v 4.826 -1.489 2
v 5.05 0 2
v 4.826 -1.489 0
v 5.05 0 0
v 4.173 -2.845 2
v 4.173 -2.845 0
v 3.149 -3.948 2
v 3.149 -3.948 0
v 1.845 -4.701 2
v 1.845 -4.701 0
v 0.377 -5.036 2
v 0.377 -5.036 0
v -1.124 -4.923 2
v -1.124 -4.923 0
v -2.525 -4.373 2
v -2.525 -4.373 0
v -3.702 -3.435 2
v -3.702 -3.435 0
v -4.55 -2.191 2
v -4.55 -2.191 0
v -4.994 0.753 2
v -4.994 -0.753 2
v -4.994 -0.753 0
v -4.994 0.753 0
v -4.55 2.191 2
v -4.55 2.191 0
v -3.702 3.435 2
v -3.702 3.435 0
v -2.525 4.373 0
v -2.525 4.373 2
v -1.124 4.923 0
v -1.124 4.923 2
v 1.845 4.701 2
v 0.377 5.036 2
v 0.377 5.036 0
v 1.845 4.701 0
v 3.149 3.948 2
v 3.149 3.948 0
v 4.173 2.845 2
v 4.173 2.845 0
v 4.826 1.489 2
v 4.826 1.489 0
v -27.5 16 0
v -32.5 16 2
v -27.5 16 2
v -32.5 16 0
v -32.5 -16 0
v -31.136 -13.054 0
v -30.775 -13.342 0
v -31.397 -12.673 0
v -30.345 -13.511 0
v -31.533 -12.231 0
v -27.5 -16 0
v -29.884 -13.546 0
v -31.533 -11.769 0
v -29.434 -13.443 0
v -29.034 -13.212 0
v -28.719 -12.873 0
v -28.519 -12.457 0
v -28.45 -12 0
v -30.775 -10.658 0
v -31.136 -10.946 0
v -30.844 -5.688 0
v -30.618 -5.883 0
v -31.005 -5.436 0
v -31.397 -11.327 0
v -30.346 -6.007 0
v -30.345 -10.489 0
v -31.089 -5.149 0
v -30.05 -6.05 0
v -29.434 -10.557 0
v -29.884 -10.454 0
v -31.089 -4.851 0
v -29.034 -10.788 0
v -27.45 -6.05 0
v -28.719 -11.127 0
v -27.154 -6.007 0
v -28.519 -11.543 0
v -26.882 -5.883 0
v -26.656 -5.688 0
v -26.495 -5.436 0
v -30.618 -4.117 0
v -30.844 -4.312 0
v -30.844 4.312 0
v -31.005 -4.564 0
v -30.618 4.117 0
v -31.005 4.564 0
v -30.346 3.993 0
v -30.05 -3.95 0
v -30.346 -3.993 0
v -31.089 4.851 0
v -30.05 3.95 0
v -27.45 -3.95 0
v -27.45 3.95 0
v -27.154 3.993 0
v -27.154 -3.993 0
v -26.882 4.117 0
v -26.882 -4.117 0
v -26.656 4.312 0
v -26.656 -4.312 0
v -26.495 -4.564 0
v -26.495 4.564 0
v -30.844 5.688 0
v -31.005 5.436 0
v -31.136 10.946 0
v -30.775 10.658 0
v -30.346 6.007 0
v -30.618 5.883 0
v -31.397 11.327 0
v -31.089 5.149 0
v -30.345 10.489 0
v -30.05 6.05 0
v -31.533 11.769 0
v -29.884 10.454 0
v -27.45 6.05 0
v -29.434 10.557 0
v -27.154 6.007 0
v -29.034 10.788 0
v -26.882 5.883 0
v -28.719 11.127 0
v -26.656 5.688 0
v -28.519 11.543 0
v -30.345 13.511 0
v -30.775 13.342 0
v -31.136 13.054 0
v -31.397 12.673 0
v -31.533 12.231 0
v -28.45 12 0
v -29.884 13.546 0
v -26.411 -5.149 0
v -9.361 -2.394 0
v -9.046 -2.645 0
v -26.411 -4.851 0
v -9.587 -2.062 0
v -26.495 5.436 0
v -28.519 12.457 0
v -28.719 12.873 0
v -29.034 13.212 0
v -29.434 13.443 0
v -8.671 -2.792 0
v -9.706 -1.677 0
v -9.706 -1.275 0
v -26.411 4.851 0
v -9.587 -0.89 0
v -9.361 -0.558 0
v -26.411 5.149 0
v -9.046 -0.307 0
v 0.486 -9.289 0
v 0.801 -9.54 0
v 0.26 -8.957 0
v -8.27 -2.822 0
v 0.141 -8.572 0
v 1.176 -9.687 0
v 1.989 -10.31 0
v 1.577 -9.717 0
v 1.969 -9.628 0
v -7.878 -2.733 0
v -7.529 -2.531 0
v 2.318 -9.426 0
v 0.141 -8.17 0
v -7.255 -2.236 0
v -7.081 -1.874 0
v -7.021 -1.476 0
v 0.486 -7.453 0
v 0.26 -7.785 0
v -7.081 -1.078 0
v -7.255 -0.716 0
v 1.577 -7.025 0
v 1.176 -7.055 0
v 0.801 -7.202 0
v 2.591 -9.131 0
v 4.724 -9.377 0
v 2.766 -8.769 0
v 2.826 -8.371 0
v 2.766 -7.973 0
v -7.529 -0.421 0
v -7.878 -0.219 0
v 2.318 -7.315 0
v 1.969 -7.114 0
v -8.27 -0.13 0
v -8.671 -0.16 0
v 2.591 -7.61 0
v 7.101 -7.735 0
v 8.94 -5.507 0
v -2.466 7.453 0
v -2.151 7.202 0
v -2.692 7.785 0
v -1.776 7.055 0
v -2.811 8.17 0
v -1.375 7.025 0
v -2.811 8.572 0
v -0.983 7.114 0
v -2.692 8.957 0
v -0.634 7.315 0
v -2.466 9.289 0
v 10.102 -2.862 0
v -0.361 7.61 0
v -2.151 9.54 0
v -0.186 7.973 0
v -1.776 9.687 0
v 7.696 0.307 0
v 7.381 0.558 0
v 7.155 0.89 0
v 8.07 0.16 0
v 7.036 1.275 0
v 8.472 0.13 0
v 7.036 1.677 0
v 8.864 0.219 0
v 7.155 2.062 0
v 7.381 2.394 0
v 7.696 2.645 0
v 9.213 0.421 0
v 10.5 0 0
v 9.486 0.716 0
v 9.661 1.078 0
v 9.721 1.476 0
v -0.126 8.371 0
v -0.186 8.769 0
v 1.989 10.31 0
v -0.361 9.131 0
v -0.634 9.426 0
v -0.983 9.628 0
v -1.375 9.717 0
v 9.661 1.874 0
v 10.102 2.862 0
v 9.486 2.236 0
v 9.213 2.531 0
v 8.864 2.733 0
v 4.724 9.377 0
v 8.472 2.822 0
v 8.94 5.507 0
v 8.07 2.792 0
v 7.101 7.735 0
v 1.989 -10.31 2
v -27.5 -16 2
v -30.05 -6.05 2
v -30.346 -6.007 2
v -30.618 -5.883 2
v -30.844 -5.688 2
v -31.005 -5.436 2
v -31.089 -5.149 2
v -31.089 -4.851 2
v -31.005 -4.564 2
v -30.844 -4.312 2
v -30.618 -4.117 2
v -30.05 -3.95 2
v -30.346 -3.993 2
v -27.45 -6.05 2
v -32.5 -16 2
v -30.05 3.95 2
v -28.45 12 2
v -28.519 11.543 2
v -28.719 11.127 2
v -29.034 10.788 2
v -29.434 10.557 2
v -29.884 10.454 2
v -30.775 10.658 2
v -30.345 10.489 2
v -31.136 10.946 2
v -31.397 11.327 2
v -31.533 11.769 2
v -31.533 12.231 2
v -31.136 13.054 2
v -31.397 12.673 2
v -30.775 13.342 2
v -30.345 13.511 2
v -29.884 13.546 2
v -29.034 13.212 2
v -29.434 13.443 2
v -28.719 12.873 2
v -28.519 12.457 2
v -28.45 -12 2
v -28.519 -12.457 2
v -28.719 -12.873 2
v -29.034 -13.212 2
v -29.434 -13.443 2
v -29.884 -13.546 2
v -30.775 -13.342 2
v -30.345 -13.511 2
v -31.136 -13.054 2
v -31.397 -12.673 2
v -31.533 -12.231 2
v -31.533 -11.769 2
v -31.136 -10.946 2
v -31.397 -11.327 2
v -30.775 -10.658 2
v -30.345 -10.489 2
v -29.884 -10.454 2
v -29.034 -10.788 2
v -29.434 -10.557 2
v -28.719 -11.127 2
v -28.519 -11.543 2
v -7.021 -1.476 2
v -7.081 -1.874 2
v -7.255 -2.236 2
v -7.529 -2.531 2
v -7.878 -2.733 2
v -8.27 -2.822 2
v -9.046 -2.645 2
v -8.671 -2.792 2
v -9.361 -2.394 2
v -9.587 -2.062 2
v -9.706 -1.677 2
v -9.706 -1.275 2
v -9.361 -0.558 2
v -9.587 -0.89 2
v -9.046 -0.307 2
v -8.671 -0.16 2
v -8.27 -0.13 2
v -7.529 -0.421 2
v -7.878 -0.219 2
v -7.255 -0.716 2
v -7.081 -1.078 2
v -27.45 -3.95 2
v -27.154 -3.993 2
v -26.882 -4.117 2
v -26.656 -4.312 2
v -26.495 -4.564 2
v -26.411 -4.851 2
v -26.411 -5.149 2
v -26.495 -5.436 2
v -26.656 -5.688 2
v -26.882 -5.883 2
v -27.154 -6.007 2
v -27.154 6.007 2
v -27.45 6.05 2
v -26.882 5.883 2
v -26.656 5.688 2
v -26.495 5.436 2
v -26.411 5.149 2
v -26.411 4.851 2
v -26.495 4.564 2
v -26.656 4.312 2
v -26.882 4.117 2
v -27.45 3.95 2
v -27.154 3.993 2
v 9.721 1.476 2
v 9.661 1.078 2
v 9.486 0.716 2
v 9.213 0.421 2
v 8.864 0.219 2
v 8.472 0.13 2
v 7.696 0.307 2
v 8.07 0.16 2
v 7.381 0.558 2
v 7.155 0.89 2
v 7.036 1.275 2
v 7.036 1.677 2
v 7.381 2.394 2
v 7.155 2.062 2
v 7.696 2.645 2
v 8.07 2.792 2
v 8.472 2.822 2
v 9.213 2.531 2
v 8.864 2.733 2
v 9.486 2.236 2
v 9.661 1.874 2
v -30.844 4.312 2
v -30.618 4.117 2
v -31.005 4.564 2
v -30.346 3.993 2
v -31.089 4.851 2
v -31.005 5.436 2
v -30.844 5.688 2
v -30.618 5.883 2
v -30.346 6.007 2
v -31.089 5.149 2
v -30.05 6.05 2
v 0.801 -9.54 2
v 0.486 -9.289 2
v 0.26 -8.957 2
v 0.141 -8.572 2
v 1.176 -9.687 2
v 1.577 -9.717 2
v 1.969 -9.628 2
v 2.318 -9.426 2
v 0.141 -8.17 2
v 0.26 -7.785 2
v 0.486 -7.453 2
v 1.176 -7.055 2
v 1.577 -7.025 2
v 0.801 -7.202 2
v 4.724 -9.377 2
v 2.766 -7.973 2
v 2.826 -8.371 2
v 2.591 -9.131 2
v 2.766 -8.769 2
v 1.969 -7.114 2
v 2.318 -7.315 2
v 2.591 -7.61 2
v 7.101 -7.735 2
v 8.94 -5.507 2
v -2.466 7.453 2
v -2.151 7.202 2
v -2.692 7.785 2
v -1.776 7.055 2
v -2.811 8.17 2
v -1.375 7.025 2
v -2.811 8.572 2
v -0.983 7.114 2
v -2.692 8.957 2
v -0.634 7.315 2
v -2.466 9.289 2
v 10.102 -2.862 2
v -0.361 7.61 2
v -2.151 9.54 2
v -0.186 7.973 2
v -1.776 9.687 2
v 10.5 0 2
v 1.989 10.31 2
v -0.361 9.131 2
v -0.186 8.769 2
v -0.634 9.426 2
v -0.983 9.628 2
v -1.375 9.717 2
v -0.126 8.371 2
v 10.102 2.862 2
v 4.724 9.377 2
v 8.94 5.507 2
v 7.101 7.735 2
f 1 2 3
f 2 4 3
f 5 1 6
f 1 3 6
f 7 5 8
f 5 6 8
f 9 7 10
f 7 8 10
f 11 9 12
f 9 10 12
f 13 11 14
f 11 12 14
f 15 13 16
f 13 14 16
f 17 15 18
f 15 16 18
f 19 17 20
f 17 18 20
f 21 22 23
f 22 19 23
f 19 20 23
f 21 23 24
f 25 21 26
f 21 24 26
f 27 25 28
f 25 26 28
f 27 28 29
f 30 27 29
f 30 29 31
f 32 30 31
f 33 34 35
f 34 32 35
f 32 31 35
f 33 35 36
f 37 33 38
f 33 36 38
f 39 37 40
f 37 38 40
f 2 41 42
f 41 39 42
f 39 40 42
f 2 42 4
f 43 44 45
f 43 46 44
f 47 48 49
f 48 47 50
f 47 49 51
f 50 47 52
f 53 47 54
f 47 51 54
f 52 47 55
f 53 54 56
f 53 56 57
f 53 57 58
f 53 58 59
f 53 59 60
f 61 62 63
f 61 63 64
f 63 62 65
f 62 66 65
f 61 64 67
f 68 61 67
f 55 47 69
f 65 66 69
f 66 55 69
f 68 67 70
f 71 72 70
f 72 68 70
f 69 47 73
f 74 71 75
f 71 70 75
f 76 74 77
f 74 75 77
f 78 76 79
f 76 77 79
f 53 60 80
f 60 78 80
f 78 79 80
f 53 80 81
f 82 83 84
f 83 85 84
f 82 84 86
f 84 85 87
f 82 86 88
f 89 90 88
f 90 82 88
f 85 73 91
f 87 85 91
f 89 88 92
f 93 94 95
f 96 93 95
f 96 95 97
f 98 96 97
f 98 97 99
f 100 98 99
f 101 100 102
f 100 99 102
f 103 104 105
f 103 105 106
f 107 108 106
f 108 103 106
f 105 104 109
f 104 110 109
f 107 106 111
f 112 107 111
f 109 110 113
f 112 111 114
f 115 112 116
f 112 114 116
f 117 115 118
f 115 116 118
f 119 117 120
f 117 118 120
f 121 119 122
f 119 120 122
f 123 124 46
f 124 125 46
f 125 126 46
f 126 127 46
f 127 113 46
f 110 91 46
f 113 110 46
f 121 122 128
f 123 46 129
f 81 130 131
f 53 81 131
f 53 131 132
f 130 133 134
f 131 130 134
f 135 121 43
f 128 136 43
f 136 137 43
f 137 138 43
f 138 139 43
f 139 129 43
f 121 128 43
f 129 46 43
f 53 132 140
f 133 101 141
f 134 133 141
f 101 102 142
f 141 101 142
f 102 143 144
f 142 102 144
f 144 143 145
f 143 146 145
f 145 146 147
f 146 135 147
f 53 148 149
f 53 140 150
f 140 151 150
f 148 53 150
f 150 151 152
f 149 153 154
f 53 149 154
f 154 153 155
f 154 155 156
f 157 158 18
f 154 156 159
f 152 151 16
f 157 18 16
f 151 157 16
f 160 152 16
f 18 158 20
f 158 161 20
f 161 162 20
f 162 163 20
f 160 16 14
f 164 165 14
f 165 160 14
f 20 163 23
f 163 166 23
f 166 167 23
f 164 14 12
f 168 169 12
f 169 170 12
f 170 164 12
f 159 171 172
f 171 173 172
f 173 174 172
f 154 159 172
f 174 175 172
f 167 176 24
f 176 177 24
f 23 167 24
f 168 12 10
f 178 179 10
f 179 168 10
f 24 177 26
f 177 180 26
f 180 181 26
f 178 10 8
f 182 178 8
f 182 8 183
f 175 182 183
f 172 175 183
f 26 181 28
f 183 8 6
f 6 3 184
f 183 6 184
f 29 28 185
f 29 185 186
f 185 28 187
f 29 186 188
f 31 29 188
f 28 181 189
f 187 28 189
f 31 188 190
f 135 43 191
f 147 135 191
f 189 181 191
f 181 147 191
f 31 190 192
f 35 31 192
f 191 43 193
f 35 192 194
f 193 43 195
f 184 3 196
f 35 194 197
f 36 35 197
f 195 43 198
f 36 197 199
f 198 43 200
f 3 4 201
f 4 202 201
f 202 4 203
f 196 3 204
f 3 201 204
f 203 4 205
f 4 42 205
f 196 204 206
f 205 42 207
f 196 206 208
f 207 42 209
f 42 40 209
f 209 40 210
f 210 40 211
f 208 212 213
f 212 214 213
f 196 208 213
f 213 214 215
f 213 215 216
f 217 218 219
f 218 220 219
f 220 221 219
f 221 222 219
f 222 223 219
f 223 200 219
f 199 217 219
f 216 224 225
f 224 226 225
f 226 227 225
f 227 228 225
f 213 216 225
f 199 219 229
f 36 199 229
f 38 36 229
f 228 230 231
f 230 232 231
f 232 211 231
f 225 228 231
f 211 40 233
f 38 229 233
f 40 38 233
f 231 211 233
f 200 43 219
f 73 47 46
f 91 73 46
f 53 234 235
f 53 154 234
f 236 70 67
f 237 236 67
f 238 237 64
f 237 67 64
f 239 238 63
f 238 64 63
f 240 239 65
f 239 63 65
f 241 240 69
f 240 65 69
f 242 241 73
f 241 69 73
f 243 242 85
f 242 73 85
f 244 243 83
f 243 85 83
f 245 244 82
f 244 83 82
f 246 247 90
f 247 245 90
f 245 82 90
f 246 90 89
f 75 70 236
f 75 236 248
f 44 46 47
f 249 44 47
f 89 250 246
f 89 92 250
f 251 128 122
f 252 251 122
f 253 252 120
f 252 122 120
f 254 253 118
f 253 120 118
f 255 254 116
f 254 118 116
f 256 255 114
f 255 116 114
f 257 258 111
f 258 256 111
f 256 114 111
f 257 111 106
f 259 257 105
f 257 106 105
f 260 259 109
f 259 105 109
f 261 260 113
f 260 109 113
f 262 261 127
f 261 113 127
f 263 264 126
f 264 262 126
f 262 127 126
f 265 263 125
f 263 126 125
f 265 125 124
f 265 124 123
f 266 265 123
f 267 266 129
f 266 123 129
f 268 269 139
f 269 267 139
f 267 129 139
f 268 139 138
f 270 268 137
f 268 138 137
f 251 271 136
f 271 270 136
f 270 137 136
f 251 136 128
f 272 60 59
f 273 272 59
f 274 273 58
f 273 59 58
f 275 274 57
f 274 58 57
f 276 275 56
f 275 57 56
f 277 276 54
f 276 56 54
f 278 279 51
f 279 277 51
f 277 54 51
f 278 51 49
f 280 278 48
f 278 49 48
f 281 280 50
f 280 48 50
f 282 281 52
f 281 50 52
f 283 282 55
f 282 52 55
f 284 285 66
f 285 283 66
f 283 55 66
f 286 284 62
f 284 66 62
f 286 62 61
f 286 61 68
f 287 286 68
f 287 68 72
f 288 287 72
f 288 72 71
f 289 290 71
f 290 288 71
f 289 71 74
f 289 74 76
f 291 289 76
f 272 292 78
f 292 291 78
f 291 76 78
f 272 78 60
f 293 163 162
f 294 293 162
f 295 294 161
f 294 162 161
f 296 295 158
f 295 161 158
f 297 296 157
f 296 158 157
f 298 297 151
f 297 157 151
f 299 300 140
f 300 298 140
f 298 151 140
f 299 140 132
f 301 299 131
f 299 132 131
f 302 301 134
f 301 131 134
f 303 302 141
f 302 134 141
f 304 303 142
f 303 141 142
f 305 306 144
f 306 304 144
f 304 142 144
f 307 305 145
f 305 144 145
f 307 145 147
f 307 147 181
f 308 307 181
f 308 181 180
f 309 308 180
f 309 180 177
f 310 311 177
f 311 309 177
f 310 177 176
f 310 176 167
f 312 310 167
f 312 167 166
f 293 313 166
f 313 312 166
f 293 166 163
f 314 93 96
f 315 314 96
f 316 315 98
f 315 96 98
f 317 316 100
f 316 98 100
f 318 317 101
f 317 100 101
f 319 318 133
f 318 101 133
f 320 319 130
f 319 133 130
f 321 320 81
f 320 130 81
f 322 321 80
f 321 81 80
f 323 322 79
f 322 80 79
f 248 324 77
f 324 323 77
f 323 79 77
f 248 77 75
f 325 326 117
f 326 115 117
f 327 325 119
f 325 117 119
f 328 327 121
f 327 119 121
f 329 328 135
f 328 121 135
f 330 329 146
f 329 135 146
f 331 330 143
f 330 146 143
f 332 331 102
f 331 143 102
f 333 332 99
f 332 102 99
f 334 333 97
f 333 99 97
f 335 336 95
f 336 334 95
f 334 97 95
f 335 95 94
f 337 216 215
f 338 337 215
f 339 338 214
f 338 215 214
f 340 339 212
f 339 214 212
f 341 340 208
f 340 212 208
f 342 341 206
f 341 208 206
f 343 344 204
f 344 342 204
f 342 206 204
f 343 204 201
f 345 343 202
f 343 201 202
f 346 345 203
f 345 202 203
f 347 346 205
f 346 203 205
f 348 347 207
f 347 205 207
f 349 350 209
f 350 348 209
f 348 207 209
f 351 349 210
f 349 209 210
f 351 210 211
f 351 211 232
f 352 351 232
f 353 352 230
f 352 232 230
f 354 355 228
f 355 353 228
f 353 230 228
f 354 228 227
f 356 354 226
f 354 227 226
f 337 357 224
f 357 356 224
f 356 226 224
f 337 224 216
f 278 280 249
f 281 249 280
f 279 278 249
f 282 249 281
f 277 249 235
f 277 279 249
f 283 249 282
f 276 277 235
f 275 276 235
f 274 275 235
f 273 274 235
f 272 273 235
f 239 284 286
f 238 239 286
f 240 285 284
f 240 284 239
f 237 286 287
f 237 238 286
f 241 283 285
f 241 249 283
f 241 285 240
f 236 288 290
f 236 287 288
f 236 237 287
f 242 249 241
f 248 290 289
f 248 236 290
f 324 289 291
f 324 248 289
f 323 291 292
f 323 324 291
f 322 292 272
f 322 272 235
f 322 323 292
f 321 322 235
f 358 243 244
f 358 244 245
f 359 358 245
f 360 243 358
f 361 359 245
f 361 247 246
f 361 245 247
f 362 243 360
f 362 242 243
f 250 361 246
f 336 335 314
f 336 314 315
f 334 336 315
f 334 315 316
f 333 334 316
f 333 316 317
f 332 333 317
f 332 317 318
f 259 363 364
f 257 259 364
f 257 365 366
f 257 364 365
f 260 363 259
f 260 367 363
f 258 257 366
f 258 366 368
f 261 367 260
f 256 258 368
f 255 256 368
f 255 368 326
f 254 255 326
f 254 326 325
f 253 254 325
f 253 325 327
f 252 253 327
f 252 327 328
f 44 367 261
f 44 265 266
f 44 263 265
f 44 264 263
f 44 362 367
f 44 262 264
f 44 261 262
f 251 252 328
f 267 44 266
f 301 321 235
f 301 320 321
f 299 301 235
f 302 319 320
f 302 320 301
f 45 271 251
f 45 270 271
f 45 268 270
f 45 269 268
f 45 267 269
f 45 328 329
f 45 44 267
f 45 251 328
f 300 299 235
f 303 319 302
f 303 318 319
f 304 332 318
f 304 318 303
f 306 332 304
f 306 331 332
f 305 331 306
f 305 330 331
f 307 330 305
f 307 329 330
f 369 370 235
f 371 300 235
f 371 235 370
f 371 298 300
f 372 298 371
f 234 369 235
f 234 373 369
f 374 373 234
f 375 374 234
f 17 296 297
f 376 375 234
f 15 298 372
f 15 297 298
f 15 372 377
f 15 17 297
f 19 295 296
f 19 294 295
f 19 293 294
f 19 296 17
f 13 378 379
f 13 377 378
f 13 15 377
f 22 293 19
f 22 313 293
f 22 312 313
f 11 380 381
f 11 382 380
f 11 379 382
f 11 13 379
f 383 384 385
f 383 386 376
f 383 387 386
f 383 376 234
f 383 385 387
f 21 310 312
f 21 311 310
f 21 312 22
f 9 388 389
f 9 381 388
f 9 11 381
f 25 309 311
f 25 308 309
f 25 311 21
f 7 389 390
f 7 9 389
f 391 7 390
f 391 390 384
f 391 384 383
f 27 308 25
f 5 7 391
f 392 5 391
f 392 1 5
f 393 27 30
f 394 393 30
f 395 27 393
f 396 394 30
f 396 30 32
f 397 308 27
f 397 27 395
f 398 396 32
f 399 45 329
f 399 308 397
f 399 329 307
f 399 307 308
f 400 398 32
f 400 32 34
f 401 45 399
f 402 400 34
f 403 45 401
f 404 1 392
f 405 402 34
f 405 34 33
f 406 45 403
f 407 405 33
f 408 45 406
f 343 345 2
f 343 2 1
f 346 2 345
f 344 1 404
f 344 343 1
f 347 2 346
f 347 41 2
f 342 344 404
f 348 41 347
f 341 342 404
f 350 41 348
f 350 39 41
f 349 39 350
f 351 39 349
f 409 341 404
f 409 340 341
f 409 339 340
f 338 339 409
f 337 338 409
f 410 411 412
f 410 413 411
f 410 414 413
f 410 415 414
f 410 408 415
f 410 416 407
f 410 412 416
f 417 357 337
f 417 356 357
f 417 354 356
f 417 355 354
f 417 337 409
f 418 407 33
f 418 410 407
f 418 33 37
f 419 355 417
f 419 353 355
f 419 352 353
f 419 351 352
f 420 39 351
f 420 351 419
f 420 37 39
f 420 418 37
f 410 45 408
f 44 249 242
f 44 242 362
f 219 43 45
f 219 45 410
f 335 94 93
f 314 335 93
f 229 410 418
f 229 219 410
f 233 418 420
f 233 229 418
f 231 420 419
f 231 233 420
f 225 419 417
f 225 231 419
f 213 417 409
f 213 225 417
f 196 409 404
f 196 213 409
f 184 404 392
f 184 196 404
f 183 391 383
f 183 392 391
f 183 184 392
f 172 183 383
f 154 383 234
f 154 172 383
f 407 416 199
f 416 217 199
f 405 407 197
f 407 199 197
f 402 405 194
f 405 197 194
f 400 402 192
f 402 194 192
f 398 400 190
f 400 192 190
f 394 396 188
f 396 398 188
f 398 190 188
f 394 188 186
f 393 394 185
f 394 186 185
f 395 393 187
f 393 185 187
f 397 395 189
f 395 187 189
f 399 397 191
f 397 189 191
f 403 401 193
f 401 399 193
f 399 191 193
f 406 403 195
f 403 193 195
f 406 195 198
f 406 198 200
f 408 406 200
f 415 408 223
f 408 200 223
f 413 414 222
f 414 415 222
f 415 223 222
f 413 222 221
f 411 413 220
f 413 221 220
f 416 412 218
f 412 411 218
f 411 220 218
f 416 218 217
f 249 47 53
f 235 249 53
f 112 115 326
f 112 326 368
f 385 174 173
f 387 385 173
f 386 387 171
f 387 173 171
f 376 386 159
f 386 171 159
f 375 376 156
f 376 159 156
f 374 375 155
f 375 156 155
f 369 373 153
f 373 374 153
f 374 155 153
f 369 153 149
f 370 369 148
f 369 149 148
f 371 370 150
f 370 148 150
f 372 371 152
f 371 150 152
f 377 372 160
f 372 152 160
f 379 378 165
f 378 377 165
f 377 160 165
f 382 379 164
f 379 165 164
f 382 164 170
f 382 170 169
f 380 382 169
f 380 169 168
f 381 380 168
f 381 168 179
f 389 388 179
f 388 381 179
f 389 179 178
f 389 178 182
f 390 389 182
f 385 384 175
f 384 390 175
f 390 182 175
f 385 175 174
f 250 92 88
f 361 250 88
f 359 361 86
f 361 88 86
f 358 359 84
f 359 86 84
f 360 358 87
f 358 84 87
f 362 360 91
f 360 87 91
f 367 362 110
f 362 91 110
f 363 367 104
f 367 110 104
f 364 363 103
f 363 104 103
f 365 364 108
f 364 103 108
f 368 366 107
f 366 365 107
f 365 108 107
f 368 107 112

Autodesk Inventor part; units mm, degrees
ref_plane "YZ Plane" through (0, 0, 0) normal (1, 0, 0) x (0, 1, 0)
ref_plane "XZ Plane" through (0, 0, 0) normal (0, 1, 0) x (-1, 0, 0)
ref_plane "XY Plane" through (0, 0, 0) normal (0, 0, 1) x (1, 0, 0)
sketch "スケッチ1" plane through (0, 0, 0) normal (0, 0, 1) x (1, 0, 0)
  circle A0 centre (-1.476, 8.3709) radius 1.35
  circle A1 centre (0, 0) radius 5.05
  line L0 (-30, 6) -> (-27.5, 6) construction
  line L1 (-27.5, 6) -> (-27.5, -6) construction
  line L2 (-27.5, -6) -> (-30, -6) construction
  line L3 (-30, -6) -> (-30, 6) construction
  line L4 (-27.45, 6.05) -> (-30.05, 6.05) construction
  line L5 (-30.05, 6.05) -> (-30.05, -6.05) construction
  line L6 (-30.05, -6.05) -> (-27.45, -6.05) construction
  line L7 (-27.45, -6.05) -> (-27.45, 6.05) construction
  circle A2 centre (-30.05, 5) radius 1.05 construction
  line L8 (-27.45, 6.05) -> (-30.05, 6.05)
  arc A3 (-30.05, 6.05) -> (-30.05, 3.95) centre (-30.05, 5) ccw
  line L9 (-30.05, 3.95) -> (-30.05, -3.95)
  line L10 (-28.75, 6.05) -> (-28.75, -6.05) construction
  line L11 (-30.05, 0) -> (-27.5, 0) construction
  arc A4 (-30.05, -3.95) -> (-30.05, -6.05) centre (-30.05, -5) ccw
  line L12 (-30.05, -6.05) -> (-27.45, -6.05)
  line L13 (-27.45, 3.95) -> (-27.45, -3.95)
  arc A5 (-27.45, 3.95) -> (-27.45, 6.05) centre (-27.45, 5) ccw
  arc A6 (-27.45, -6.05) -> (-27.45, -3.95) centre (-27.45, -5) ccw
  circle A7 centre (-30, 12) radius 1.55
  circle A8 centre (-30, -12) radius 1.55
  line L14 (-32.5, 16) -> (-27.5, 16)
  line L15 (-32.5, -16) -> (-27.5, -16)
  arc A9 (1.9894, -10.3098) -> (1.9894, 10.3098) centre (0, 0) ccw
  line L16 (-32.5, 16) -> (-32.5, -16)
  line L17 (-27.5, 16) -> (1.9894, 10.3098)
  line L18 (1.9894, -10.3098) -> (-27.5, -16)
  line L19 (-1.476, 8.3709) -> (0, 0) construction
  line L20 (0, 10.6937) -> (0, -10.6937) construction
  circle A10 centre (-8.3709, -1.476) radius 1.35
  circle A11 centre (1.476, -8.3709) radius 1.35
  circle A12 centre (8.3709, 1.476) radius 1.35
  point P0 (-28.775, 0)
  dimension "d29" = 2.1
  dimension "d4" = 2.7
  dimension "d9" = 10.1
  dimension "d10" = 2.5
  dimension "d30" = 0.05
  dimension "d31" = 6
  dimension "d33" = 3.1
  dimension "d57" = 32
  dimension "d61" = 32.5
  dimension "d62" = 5
  dimension "d63" = 2.5
  dimension "d65" = 10
  dimension "d66" = 10.5
  dimension "d67" = 8.5
  dimension "d69" = 10
  dimension "d72" = 360
extrude "押し出し1" add sketch "スケッチ1" along normal blind 2
equation "\"d23\" = 7"
properties part number "Shoulder_side_frame" material "アルミニウム 2014-T4"
